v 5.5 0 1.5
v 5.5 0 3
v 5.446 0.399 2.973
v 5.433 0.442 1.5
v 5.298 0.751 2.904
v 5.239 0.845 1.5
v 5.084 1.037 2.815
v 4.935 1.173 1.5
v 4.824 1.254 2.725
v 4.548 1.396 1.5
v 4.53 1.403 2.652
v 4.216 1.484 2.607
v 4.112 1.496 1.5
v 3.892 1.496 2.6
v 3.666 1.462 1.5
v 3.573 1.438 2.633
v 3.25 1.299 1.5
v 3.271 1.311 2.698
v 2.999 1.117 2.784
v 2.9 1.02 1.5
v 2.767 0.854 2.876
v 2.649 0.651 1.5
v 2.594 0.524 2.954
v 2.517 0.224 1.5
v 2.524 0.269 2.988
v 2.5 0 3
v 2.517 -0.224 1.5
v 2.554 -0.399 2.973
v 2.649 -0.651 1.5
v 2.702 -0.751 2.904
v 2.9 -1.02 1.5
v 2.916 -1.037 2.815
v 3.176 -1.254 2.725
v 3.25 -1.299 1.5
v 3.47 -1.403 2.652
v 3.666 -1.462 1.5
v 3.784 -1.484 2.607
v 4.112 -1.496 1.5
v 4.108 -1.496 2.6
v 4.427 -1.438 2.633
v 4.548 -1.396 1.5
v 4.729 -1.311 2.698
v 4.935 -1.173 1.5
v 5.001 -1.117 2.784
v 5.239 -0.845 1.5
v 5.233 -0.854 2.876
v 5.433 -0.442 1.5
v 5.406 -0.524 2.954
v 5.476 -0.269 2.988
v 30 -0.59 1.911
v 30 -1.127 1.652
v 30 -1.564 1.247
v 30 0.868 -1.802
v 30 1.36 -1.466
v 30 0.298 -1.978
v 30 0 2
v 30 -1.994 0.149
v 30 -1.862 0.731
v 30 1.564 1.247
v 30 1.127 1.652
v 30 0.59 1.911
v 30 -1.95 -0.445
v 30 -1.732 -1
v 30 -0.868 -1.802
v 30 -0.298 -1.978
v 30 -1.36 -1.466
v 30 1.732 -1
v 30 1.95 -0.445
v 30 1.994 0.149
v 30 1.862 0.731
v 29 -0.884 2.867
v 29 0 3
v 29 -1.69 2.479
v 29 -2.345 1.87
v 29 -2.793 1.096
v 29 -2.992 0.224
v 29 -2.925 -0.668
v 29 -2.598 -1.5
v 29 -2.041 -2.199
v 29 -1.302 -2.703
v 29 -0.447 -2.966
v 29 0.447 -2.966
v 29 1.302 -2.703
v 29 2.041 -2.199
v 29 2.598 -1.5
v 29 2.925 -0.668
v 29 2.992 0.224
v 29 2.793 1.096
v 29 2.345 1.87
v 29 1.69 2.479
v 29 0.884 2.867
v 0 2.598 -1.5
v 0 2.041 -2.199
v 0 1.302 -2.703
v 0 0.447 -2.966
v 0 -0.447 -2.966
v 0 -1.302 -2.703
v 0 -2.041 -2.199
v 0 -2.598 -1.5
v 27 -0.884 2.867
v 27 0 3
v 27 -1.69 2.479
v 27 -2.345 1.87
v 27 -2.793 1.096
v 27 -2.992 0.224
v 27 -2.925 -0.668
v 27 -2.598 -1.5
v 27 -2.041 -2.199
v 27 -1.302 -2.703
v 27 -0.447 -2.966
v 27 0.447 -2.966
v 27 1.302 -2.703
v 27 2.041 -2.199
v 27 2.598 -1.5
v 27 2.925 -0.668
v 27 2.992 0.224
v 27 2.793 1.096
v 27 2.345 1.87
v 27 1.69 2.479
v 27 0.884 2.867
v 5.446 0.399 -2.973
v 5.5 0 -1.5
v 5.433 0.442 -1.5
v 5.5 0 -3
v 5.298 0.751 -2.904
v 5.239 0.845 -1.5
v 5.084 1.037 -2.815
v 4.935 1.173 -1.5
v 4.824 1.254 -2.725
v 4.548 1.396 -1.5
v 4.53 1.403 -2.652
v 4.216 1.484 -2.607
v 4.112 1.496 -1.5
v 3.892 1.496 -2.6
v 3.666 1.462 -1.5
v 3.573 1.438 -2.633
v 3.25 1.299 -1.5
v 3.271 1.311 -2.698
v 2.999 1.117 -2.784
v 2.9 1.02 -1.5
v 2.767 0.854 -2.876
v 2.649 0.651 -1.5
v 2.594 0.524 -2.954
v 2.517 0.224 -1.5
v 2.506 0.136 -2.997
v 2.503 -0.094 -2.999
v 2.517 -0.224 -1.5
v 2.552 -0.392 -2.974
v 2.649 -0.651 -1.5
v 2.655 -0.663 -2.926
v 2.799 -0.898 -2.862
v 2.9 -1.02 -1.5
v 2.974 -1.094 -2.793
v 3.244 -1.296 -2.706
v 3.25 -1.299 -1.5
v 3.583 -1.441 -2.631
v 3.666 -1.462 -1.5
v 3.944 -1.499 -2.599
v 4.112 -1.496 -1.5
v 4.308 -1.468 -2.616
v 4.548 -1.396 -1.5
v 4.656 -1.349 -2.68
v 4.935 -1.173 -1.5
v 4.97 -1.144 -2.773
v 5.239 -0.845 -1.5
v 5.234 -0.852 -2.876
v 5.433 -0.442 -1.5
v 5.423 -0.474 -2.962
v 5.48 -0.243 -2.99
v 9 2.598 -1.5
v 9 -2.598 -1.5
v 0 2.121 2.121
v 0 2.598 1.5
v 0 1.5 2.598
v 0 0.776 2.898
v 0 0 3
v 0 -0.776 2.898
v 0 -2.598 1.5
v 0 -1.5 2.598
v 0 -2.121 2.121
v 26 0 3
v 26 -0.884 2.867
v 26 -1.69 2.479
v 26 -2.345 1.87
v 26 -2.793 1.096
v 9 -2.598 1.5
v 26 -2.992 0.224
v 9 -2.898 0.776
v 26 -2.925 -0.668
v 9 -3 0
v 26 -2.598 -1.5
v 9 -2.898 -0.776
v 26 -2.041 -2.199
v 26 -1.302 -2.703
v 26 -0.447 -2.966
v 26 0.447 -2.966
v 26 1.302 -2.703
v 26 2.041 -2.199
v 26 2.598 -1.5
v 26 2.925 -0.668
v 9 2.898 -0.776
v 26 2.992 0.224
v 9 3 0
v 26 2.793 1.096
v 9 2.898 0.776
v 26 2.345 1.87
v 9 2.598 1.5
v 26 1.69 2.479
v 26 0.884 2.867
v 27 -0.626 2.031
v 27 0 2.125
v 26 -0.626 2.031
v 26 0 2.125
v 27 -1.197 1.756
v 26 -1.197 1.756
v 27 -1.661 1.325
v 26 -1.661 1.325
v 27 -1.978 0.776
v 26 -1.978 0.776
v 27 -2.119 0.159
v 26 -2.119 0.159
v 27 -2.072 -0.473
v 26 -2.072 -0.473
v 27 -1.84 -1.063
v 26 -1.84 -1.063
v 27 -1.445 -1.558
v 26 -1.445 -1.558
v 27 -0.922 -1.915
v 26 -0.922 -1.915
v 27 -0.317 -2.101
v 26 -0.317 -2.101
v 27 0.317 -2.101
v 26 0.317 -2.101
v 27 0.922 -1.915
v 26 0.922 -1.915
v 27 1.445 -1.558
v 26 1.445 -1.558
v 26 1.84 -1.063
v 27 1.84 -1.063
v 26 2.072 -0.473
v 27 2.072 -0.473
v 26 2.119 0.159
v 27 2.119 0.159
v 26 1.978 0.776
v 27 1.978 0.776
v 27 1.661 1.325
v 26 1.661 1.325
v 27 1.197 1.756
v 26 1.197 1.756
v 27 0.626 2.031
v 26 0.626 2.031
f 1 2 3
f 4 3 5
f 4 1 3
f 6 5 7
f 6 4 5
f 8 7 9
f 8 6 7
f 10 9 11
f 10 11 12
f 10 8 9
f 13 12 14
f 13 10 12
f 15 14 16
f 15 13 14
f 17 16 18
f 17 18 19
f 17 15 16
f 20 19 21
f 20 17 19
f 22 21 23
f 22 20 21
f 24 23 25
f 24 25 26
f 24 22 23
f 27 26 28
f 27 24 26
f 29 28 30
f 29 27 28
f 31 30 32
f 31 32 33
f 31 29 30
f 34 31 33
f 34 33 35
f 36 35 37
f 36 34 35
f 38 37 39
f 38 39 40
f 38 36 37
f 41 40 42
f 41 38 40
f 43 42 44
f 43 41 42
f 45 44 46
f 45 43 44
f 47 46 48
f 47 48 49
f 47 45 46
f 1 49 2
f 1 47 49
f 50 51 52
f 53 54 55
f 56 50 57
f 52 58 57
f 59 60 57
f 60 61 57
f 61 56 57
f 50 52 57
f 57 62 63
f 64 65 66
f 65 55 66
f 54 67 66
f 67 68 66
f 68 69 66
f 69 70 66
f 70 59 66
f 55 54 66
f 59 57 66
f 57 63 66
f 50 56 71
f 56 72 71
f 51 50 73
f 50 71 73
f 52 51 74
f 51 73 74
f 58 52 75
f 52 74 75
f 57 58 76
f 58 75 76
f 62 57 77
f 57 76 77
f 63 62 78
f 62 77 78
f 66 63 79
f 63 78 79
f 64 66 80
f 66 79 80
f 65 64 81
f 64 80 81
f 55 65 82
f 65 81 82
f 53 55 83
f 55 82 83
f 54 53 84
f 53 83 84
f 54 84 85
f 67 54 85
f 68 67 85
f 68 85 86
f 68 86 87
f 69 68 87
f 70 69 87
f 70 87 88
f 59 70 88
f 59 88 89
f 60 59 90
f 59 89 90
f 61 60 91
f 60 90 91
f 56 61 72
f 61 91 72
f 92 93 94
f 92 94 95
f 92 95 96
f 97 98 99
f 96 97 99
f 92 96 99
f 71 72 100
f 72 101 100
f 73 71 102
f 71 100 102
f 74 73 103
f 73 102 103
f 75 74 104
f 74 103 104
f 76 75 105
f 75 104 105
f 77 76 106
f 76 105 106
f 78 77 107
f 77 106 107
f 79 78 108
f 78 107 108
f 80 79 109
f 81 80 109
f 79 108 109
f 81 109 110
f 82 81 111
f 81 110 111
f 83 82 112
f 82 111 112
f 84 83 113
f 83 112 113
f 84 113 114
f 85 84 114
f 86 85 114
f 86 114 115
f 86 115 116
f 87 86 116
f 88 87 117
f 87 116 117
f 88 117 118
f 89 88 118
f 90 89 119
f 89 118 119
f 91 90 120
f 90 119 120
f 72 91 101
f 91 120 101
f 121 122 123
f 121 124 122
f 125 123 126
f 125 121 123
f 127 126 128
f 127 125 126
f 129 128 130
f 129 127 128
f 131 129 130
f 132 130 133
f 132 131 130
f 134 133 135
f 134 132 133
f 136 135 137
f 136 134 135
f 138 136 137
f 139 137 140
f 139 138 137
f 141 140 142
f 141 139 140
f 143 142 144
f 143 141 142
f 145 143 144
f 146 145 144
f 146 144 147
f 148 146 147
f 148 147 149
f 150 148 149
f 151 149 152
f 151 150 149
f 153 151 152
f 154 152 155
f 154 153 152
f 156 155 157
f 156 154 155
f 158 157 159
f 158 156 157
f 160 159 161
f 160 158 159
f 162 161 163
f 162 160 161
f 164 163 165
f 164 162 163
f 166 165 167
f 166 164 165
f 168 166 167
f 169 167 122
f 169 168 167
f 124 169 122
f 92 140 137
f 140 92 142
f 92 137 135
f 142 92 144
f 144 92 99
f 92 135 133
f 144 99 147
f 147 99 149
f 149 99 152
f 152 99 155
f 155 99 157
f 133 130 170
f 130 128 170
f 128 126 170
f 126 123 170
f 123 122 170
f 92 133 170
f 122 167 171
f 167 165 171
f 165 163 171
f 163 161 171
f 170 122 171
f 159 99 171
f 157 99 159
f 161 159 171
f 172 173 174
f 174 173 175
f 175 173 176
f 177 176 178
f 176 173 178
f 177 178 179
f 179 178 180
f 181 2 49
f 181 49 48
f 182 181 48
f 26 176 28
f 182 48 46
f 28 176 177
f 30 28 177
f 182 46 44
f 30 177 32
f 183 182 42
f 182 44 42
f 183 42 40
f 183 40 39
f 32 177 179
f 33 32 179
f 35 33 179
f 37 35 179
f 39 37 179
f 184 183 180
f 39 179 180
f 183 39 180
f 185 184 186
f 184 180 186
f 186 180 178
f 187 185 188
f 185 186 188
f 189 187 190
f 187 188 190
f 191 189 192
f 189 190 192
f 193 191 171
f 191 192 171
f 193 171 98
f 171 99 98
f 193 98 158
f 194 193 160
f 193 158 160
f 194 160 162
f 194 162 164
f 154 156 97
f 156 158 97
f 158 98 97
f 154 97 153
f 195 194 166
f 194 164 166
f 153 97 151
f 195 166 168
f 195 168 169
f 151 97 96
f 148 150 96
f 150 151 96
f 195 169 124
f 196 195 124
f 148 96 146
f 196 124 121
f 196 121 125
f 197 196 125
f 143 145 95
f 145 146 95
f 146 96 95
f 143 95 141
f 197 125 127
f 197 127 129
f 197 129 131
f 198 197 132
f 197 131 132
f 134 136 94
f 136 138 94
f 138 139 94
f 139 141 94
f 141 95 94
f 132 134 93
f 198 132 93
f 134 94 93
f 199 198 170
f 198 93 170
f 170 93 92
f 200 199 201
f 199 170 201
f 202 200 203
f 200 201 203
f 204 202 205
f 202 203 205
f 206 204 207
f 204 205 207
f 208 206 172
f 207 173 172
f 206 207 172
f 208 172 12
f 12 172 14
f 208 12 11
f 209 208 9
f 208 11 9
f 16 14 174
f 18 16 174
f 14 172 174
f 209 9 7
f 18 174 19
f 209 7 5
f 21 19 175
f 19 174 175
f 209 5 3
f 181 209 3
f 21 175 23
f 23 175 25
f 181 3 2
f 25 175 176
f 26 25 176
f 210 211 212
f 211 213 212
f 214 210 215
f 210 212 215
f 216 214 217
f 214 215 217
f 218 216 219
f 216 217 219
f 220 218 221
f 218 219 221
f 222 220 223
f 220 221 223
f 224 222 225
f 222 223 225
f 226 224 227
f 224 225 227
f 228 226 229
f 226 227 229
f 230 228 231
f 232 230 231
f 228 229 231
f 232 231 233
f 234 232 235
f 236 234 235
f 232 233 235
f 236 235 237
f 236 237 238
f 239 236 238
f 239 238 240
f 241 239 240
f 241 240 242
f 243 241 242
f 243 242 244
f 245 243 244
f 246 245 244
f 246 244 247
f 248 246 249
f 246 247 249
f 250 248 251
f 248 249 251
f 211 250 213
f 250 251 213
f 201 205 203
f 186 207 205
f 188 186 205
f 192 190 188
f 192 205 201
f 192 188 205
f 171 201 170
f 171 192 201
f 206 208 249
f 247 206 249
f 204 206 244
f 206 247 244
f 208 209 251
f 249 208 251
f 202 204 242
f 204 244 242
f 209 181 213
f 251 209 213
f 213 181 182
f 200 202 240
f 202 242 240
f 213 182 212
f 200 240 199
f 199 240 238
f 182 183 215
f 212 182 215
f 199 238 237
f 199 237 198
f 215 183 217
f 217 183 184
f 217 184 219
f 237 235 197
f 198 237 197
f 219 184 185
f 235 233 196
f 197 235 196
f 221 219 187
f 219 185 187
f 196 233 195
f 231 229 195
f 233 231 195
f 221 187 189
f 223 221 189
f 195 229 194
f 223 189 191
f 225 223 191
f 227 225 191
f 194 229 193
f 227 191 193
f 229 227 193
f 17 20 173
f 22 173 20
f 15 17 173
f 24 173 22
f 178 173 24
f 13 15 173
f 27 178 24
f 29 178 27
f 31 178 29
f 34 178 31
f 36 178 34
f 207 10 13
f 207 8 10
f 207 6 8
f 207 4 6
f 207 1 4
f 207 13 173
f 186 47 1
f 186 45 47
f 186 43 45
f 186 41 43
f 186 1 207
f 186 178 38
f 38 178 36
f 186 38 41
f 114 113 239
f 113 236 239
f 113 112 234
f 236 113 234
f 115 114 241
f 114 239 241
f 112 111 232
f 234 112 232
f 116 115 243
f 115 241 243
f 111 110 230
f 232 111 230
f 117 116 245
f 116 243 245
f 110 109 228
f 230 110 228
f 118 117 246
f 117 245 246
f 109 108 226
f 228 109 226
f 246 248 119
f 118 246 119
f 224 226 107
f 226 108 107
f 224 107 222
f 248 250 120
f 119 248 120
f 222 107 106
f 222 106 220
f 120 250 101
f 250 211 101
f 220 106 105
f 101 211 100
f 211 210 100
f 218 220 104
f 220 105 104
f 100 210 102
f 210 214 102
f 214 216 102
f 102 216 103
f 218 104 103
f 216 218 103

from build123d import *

# Parameters (mm, degrees)
CUT_EXTRUDE1_DEPTH      = 31.298514815
CUT_EXTRUDE1_DEPTH_BACK = 31.298514815
SKETCH2_W               = 9
SKETCH2_H               = 3
CUT_EXTRUDE2_DEPTH      = 31.298514815
CUT_EXTRUDE2_DEPTH_BACK = 31.298514815
SKETCH3_R               = 1.5


with BuildPart() as part:
    # Sketch1 → Revolve1 (revolve)
    with BuildSketch(Plane.XY, mode=Mode.PRIVATE) as revolve1_sk:
        Polygon((30, 0), (30, 2), (29, 3), (27, 3), (27, 2.125), (26, 2.125), (26, 3), (0, 3), (0, 0), align=None)
    revolve(revolve1_sk.sketch.rotate(Axis((0, 0, 0), (1, 0, 0)), 90), axis=Axis((0, 0, 0), (1, 0, 0)))

    # Sketch2 → Cut-Extrude1 (cut, two sides: drawn at the far end of the back side and taken through both)
    with BuildSketch(Plane(origin=(0, 0, 0), x_dir=(1, 0, 0), z_dir=(0, 1, 0)).offset(-CUT_EXTRUDE1_DEPTH_BACK)):
        with Locations((4.5, 0)):
            Rectangle(SKETCH2_W, SKETCH2_H)
    extrude(amount=CUT_EXTRUDE1_DEPTH + CUT_EXTRUDE1_DEPTH_BACK, mode=Mode.SUBTRACT)

    # Sketch3 → Cut-Extrude2 (cut, two sides: drawn at the far end of the back side and taken through both)
    with BuildSketch(Plane.XY.offset(-CUT_EXTRUDE2_DEPTH_BACK)):
        with Locations((4, 0)):
            Circle(SKETCH3_R)
    extrude(amount=CUT_EXTRUDE2_DEPTH + CUT_EXTRUDE2_DEPTH_BACK, mode=Mode.SUBTRACT)


solid = part.part
